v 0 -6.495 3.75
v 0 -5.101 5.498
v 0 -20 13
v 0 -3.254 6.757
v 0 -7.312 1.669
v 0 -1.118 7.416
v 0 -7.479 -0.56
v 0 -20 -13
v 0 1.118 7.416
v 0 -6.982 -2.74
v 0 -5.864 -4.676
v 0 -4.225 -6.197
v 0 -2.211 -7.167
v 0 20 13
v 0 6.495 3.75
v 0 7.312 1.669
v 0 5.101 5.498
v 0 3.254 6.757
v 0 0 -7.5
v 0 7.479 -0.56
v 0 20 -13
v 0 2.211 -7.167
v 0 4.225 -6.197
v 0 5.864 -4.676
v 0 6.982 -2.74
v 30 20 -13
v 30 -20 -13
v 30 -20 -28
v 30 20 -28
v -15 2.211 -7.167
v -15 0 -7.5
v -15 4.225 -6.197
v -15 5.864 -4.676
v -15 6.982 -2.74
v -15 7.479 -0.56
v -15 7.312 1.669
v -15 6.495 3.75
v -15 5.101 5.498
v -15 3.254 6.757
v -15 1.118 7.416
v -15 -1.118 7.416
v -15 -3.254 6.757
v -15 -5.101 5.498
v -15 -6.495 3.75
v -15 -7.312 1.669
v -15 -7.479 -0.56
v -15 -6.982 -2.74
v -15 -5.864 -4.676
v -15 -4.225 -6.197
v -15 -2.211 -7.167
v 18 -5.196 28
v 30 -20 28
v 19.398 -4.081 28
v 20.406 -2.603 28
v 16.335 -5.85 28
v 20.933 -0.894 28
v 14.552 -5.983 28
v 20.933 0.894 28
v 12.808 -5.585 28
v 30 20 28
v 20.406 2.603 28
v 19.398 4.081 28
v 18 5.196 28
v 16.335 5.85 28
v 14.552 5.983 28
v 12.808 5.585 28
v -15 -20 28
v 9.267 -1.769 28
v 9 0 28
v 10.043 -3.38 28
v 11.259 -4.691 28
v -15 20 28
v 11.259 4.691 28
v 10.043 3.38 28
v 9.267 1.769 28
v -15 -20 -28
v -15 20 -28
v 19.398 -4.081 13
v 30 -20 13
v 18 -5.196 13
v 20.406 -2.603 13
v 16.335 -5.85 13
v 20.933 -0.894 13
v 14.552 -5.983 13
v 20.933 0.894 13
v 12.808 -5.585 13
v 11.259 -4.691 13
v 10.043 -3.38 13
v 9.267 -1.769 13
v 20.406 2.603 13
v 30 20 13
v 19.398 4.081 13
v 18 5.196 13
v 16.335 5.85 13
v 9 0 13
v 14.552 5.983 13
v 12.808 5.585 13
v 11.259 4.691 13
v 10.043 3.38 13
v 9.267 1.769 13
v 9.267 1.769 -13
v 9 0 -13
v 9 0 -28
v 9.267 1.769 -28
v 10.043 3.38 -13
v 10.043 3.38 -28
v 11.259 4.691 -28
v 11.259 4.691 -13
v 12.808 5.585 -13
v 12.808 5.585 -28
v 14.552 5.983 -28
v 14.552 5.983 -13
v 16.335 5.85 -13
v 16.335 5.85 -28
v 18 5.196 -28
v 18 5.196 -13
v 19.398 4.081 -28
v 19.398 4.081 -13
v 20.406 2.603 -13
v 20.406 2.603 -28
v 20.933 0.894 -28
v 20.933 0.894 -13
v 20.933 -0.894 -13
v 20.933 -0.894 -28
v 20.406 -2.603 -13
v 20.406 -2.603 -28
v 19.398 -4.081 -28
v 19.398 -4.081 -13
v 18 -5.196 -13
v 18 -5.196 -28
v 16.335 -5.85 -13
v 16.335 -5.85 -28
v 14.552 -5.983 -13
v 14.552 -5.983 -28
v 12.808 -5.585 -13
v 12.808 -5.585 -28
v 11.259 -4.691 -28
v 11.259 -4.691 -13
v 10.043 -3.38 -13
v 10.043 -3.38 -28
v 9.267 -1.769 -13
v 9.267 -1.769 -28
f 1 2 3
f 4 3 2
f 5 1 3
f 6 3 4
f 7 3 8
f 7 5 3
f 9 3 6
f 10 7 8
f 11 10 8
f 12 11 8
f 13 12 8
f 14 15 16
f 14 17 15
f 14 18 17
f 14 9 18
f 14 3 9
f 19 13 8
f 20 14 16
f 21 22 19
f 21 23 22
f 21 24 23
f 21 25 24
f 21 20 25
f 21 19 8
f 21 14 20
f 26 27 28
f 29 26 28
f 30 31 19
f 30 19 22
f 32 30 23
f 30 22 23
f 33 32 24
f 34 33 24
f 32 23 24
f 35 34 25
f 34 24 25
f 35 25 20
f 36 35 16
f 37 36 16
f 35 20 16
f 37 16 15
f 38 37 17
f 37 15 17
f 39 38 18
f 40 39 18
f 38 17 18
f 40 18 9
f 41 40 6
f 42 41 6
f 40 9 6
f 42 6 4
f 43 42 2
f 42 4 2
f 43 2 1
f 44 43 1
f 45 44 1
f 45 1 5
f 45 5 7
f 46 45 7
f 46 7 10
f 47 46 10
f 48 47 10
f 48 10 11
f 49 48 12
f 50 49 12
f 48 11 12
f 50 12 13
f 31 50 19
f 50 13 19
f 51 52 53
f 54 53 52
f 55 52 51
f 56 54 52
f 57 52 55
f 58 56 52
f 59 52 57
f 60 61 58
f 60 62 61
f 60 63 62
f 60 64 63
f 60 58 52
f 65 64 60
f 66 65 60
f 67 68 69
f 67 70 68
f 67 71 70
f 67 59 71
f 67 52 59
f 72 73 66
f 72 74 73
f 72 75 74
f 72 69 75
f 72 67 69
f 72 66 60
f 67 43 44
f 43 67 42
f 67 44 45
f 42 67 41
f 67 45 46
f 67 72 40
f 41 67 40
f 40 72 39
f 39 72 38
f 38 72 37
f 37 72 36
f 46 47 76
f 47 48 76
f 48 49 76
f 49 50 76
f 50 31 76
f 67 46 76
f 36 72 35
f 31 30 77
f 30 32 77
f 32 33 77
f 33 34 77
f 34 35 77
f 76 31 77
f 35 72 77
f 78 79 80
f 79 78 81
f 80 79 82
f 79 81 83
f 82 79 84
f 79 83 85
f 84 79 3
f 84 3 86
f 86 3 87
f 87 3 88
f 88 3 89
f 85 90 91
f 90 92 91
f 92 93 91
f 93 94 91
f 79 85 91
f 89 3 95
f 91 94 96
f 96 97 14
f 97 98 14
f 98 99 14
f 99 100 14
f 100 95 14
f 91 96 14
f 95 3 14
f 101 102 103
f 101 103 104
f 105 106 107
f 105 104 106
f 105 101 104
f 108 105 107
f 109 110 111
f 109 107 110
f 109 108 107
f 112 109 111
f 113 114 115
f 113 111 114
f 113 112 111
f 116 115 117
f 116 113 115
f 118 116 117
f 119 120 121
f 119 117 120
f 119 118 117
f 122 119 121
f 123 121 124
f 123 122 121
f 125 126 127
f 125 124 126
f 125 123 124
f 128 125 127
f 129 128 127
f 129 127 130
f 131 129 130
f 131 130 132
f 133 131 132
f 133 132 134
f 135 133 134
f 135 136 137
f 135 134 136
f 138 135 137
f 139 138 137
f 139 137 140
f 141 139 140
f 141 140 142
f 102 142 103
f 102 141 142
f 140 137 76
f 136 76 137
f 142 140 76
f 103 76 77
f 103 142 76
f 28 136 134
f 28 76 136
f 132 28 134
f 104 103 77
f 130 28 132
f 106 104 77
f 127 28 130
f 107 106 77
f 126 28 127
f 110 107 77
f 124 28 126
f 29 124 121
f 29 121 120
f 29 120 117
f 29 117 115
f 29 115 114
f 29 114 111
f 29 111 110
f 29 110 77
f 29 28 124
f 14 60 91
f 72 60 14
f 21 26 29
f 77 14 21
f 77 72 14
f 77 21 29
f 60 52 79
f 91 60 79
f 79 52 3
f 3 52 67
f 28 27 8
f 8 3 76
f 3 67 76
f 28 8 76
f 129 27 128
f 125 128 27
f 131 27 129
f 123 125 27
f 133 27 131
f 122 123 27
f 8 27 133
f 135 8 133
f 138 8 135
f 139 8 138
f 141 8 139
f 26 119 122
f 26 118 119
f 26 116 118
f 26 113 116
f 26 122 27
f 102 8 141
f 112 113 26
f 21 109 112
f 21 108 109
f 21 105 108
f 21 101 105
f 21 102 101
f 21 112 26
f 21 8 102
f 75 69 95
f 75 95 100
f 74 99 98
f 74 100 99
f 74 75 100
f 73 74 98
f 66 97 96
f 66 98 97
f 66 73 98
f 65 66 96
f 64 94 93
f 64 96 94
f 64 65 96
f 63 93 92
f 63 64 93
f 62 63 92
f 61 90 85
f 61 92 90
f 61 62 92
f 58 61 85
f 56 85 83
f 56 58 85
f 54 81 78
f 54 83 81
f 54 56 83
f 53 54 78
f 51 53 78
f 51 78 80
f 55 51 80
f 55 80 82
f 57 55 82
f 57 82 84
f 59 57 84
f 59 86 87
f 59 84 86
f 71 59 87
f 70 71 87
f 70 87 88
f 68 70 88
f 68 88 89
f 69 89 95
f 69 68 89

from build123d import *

# Parameters (mm, degrees)
SKETCH1_W               = 56
SKETCH1_H               = 40
SKETCH1_R               = 7.5
BOSS_EXTRUDE1_DEPTH     = 15
SKETCH1_3_W             = 15
SKETCH1_3_H             = 40
BOSS_EXTRUDE2_DEPTH     = 30
CUT_EXTRUDE1_DEPTH      = 55.598534779
CUT_EXTRUDE1_DEPTH_BACK = 55.598534779
SKETCH2_R               = 6


with BuildPart() as part:
    # Sketch1 → Boss-Extrude1 (new body)
    with BuildSketch(Plane(origin=(0, 0, 0), x_dir=(0, 0, -1), z_dir=(1, 0, 0))):
        Rectangle(SKETCH1_W, SKETCH1_H)
        Circle(SKETCH1_R, mode=Mode.SUBTRACT)
    extrude(amount=-BOSS_EXTRUDE1_DEPTH)

    # Sketch1<3> → Boss-Extrude2 (add)
    with BuildSketch(Plane(origin=(0, 0, 0), x_dir=(0, 0, -1), z_dir=(1, 0, 0))):
        with Locations((-20.5, 0)):
            Rectangle(SKETCH1_3_W, SKETCH1_3_H)
        with Locations((20.5, 0)):
            Rectangle(SKETCH1_3_W, SKETCH1_3_H)
    extrude(amount=BOSS_EXTRUDE2_DEPTH)

    # Sketch2 → Cut-Extrude1 (cut, two sides: drawn at the far end of the back side and taken through both)
    with BuildSketch(Plane(origin=(0, 0, 13), x_dir=(-1, 0, 0), z_dir=(0, 0, -1)).offset(-CUT_EXTRUDE1_DEPTH_BACK)):
        with Locations((-15, 0)):
            Circle(SKETCH2_R)
    extrude(amount=CUT_EXTRUDE1_DEPTH + CUT_EXTRUDE1_DEPTH_BACK, mode=Mode.SUBTRACT)


solid = part.part
